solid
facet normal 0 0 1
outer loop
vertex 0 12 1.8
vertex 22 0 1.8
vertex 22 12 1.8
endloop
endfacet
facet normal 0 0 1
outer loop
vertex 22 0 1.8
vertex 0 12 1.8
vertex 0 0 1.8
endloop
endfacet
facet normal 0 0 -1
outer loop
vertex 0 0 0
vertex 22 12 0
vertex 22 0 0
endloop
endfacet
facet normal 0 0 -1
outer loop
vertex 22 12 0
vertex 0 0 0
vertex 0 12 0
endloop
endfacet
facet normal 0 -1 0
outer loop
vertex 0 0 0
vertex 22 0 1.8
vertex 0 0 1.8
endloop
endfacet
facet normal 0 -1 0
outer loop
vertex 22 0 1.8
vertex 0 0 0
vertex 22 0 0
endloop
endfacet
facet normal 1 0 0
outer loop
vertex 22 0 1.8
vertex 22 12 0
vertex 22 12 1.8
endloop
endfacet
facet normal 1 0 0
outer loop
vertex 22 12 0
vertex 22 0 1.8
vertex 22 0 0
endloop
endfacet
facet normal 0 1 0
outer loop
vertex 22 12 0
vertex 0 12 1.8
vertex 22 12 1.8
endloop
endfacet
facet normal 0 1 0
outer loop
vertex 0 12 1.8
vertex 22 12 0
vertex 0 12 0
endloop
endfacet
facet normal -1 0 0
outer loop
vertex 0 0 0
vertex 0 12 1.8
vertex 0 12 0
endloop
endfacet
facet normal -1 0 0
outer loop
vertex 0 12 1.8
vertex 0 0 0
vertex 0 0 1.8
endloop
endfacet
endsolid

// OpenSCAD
include <../lib/kobo-meshcore-case-lib.scad>;
$fn = 40;
kobo_pad();
